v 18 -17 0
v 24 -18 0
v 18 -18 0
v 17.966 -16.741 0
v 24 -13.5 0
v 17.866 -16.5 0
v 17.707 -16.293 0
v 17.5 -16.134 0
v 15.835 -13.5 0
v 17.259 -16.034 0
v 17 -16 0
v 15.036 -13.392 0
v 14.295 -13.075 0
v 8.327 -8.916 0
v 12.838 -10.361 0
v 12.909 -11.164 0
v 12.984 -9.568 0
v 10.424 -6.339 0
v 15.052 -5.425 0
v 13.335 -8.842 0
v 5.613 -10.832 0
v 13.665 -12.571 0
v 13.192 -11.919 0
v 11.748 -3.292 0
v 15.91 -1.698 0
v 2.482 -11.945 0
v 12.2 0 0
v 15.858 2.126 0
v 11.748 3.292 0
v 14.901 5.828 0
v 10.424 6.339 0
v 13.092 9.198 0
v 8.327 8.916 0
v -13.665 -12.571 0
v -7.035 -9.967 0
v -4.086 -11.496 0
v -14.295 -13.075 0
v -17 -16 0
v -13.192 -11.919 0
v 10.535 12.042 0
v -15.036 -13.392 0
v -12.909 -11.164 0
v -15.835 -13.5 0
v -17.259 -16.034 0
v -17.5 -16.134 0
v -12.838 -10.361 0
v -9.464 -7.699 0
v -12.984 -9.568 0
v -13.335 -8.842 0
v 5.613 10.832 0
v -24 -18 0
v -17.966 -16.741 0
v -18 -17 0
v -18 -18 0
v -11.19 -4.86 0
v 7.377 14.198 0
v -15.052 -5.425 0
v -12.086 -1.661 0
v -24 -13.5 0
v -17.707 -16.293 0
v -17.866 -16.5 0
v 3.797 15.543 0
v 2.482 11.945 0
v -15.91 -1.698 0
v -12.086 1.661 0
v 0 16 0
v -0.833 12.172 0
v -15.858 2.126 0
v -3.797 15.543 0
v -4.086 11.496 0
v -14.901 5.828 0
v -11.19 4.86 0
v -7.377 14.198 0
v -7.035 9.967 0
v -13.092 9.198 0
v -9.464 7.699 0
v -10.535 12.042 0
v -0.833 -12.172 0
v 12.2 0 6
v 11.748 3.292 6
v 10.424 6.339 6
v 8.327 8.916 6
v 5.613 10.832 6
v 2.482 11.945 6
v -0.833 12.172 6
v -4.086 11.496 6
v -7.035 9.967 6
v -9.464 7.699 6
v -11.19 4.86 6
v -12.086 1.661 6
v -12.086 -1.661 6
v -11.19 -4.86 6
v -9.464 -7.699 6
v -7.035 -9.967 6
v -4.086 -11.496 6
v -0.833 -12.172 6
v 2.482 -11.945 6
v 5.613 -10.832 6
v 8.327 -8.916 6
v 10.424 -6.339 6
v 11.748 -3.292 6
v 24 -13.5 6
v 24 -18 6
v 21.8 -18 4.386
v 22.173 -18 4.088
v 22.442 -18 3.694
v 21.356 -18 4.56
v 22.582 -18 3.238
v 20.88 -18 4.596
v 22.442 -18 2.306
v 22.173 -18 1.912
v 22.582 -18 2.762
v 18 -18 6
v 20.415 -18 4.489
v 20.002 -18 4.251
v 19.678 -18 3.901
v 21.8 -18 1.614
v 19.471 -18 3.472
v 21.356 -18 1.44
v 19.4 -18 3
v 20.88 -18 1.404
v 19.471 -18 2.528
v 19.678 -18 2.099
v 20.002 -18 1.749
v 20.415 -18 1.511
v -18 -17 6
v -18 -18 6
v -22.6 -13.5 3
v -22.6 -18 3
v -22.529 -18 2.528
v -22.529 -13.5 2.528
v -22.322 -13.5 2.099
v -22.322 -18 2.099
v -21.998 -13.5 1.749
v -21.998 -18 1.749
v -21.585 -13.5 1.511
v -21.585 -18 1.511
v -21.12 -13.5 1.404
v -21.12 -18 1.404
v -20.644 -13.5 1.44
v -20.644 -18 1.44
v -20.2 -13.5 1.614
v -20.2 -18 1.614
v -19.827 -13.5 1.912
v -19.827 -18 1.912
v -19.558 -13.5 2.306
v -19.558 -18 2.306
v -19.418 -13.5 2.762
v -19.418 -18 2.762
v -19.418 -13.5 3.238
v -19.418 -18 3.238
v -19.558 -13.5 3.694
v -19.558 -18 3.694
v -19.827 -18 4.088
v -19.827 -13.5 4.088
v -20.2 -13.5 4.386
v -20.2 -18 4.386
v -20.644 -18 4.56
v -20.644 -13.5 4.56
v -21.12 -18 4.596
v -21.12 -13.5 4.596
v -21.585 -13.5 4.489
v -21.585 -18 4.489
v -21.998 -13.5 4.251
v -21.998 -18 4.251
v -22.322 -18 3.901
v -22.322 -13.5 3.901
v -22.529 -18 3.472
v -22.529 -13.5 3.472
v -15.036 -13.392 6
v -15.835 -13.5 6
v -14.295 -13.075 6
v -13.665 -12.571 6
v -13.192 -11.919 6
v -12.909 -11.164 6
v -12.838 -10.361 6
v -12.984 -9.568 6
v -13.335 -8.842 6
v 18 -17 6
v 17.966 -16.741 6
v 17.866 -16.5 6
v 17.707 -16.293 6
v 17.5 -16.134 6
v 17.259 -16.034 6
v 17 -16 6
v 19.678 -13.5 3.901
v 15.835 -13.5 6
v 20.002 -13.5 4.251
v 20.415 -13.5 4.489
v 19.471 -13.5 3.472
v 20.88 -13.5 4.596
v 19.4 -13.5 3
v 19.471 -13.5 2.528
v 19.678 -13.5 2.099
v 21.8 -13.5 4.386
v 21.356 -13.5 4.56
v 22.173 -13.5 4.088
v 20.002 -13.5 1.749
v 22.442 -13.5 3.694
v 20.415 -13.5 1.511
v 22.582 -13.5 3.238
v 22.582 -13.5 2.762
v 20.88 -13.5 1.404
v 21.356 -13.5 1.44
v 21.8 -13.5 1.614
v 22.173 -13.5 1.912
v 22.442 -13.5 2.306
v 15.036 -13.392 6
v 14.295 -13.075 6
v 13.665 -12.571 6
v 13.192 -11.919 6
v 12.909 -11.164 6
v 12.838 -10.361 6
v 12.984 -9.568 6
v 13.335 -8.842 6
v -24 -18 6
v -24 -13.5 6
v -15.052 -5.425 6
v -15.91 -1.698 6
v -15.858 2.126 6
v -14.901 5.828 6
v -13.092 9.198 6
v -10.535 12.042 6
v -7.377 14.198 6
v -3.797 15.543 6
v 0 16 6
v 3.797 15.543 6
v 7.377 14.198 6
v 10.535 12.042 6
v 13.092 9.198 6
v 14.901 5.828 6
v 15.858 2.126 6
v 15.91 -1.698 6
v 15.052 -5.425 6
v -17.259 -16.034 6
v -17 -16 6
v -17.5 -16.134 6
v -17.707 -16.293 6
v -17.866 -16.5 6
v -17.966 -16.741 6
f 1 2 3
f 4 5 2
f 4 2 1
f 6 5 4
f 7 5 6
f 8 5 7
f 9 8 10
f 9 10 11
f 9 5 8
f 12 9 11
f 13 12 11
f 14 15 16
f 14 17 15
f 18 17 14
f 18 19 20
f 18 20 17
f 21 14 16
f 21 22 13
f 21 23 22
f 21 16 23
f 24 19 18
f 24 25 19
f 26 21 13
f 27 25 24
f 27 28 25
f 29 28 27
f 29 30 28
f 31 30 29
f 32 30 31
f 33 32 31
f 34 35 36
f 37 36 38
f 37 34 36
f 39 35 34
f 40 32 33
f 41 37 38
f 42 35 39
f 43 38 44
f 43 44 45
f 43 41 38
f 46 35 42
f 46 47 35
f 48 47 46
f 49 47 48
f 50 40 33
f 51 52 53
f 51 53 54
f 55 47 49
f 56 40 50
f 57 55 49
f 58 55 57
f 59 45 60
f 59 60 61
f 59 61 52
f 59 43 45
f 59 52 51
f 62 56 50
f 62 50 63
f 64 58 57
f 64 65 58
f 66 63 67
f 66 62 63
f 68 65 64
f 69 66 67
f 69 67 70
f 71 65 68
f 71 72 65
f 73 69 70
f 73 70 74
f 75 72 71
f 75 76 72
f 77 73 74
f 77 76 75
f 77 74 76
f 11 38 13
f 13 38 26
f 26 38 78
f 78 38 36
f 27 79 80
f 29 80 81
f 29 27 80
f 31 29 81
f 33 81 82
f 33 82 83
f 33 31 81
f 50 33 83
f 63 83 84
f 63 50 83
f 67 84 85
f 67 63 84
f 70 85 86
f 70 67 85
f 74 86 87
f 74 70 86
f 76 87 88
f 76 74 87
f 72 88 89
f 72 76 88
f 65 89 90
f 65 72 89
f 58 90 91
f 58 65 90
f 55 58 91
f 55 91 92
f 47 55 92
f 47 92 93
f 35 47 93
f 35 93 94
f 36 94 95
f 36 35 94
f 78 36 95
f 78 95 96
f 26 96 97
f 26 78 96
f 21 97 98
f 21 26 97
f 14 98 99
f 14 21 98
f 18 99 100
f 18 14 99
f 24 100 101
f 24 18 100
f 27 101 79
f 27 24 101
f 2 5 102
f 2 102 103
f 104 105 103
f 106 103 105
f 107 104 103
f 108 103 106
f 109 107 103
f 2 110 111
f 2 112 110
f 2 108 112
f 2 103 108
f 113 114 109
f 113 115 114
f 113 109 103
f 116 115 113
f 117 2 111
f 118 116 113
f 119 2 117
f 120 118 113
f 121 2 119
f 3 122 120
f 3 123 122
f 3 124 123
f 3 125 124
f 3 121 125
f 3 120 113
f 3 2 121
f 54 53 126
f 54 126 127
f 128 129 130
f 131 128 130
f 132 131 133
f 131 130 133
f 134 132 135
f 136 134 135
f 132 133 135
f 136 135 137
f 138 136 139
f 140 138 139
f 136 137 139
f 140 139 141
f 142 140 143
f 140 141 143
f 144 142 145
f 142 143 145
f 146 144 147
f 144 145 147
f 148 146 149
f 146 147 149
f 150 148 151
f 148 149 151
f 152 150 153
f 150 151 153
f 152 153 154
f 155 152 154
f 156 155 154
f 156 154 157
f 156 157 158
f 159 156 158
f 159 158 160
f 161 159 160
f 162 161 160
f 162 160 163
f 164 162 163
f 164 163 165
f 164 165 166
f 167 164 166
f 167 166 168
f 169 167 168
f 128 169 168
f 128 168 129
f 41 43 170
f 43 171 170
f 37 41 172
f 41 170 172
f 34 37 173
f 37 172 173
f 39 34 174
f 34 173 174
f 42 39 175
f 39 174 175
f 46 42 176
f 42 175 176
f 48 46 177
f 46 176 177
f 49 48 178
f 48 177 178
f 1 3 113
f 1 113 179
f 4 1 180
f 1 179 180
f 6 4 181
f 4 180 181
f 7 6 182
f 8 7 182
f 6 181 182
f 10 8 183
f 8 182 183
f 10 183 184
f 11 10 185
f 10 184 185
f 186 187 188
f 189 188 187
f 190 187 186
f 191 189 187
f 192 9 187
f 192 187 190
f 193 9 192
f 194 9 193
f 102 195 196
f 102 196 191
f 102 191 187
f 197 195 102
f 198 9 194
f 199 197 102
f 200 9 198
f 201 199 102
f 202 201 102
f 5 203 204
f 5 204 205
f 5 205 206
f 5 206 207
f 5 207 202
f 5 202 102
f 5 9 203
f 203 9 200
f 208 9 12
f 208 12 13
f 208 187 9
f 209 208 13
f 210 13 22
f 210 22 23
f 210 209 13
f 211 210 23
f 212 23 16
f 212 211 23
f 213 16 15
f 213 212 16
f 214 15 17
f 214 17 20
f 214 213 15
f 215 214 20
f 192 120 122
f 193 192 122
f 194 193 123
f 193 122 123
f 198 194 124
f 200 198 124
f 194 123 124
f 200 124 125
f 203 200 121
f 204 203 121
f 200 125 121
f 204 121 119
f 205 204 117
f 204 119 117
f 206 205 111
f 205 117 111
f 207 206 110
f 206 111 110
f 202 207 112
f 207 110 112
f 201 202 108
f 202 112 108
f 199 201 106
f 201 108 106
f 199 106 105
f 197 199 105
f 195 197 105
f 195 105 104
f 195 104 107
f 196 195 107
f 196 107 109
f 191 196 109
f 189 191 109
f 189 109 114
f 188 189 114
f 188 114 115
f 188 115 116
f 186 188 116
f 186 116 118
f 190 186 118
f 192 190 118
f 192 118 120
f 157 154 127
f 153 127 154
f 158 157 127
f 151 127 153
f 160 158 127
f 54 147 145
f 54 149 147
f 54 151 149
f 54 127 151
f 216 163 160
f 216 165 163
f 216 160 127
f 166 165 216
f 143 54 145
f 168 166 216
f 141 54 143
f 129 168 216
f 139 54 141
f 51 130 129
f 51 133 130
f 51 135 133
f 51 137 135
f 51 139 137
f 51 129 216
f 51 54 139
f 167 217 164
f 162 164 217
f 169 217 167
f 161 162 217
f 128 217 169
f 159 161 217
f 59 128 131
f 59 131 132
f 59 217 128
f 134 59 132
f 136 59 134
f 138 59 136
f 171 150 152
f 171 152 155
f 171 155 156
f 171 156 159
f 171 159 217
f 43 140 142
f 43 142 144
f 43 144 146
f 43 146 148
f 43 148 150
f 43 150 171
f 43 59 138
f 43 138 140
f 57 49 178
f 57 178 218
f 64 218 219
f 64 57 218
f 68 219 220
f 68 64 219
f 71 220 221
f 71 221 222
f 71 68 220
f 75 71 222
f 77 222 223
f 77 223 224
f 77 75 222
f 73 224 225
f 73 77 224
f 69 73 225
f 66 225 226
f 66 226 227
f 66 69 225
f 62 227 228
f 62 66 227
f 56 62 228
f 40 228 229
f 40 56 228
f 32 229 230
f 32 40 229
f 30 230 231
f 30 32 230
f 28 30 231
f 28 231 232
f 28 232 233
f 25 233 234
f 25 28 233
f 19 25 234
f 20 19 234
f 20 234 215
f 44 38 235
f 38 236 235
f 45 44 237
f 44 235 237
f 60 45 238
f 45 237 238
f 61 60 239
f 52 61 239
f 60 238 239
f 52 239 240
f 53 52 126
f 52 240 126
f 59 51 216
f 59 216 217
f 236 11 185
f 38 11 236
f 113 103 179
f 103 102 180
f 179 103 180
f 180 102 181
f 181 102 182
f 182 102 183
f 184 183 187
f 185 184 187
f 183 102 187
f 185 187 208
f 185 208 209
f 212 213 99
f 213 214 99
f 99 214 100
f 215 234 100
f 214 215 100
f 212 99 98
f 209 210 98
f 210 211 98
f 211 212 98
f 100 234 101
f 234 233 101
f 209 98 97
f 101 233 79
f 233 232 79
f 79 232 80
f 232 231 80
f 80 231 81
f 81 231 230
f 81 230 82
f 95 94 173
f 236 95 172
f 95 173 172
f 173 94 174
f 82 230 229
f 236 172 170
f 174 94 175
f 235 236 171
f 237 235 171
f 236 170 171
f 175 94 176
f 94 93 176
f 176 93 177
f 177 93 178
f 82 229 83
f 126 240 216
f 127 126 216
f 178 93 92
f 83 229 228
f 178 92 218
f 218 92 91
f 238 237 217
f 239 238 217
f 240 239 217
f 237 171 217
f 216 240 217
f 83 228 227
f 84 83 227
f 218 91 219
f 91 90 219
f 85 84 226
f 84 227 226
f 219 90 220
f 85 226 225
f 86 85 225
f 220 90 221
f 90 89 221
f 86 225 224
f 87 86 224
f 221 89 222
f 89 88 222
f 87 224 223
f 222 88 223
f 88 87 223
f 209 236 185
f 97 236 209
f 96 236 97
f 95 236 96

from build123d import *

# Parameters (mm, degrees)
SKETCH1_R             = 12.2
BOSS_EXTRUDE1_DEPTH   = 6
FILLET1_R             = 3
FILLET2_R             = 1
F_3_0MM_DOWEL_HOLE1_D = 3.2


with BuildPart() as part:
    # Sketch1 → Boss-Extrude1 (new body)
    with BuildSketch(Plane.XY):
        with BuildLine():
            Line((18, -16), (-18, -16))
            Line((-18, -16), (-18, -18))
            Line((-18, -18), (-24, -18))
            Line((-24, -18), (-24, -13.5))
            Line((-24, -13.5), (-8.587782019, -13.5))
            ThreePointArc((-8.587782019, -13.5), (0, 16), (8.587782019, -13.5))
            Line((8.587782019, -13.5), (24, -13.5))
            Line((24, -13.5), (24, -18))
            Line((24, -18), (18, -18))
            Line((18, -18), (18, -16))
        make_face()
        Circle(SKETCH1_R, mode=Mode.SUBTRACT)
    extrude(amount=BOSS_EXTRUDE1_DEPTH)

    # Fillet1
    fillet1_edges = [part.edges().sort_by_distance(p)[0] for p in [
        (-8.587782019, -13.5, 3),
        (8.587782019, -13.5, 3),
    ]]
    fillet(fillet1_edges, radius=FILLET1_R)

    # Fillet2
    fillet2_edges = [part.edges().sort_by_distance(p)[0] for p in [
        (18, -16, 3),
        (-18, -16, 3),
    ]]
    fillet(fillet2_edges, radius=FILLET2_R)

    # Ø3.0mm Dowel Hole1 (through all)
    with Locations(Plane(origin=(0, -13.5, 0), x_dir=(1, 0, 0), z_dir=(0, 1, 0))):
        with Locations((-21, -3), (21, -3)):
            Hole(F_3_0MM_DOWEL_HOLE1_D / 2)


solid = part.part
